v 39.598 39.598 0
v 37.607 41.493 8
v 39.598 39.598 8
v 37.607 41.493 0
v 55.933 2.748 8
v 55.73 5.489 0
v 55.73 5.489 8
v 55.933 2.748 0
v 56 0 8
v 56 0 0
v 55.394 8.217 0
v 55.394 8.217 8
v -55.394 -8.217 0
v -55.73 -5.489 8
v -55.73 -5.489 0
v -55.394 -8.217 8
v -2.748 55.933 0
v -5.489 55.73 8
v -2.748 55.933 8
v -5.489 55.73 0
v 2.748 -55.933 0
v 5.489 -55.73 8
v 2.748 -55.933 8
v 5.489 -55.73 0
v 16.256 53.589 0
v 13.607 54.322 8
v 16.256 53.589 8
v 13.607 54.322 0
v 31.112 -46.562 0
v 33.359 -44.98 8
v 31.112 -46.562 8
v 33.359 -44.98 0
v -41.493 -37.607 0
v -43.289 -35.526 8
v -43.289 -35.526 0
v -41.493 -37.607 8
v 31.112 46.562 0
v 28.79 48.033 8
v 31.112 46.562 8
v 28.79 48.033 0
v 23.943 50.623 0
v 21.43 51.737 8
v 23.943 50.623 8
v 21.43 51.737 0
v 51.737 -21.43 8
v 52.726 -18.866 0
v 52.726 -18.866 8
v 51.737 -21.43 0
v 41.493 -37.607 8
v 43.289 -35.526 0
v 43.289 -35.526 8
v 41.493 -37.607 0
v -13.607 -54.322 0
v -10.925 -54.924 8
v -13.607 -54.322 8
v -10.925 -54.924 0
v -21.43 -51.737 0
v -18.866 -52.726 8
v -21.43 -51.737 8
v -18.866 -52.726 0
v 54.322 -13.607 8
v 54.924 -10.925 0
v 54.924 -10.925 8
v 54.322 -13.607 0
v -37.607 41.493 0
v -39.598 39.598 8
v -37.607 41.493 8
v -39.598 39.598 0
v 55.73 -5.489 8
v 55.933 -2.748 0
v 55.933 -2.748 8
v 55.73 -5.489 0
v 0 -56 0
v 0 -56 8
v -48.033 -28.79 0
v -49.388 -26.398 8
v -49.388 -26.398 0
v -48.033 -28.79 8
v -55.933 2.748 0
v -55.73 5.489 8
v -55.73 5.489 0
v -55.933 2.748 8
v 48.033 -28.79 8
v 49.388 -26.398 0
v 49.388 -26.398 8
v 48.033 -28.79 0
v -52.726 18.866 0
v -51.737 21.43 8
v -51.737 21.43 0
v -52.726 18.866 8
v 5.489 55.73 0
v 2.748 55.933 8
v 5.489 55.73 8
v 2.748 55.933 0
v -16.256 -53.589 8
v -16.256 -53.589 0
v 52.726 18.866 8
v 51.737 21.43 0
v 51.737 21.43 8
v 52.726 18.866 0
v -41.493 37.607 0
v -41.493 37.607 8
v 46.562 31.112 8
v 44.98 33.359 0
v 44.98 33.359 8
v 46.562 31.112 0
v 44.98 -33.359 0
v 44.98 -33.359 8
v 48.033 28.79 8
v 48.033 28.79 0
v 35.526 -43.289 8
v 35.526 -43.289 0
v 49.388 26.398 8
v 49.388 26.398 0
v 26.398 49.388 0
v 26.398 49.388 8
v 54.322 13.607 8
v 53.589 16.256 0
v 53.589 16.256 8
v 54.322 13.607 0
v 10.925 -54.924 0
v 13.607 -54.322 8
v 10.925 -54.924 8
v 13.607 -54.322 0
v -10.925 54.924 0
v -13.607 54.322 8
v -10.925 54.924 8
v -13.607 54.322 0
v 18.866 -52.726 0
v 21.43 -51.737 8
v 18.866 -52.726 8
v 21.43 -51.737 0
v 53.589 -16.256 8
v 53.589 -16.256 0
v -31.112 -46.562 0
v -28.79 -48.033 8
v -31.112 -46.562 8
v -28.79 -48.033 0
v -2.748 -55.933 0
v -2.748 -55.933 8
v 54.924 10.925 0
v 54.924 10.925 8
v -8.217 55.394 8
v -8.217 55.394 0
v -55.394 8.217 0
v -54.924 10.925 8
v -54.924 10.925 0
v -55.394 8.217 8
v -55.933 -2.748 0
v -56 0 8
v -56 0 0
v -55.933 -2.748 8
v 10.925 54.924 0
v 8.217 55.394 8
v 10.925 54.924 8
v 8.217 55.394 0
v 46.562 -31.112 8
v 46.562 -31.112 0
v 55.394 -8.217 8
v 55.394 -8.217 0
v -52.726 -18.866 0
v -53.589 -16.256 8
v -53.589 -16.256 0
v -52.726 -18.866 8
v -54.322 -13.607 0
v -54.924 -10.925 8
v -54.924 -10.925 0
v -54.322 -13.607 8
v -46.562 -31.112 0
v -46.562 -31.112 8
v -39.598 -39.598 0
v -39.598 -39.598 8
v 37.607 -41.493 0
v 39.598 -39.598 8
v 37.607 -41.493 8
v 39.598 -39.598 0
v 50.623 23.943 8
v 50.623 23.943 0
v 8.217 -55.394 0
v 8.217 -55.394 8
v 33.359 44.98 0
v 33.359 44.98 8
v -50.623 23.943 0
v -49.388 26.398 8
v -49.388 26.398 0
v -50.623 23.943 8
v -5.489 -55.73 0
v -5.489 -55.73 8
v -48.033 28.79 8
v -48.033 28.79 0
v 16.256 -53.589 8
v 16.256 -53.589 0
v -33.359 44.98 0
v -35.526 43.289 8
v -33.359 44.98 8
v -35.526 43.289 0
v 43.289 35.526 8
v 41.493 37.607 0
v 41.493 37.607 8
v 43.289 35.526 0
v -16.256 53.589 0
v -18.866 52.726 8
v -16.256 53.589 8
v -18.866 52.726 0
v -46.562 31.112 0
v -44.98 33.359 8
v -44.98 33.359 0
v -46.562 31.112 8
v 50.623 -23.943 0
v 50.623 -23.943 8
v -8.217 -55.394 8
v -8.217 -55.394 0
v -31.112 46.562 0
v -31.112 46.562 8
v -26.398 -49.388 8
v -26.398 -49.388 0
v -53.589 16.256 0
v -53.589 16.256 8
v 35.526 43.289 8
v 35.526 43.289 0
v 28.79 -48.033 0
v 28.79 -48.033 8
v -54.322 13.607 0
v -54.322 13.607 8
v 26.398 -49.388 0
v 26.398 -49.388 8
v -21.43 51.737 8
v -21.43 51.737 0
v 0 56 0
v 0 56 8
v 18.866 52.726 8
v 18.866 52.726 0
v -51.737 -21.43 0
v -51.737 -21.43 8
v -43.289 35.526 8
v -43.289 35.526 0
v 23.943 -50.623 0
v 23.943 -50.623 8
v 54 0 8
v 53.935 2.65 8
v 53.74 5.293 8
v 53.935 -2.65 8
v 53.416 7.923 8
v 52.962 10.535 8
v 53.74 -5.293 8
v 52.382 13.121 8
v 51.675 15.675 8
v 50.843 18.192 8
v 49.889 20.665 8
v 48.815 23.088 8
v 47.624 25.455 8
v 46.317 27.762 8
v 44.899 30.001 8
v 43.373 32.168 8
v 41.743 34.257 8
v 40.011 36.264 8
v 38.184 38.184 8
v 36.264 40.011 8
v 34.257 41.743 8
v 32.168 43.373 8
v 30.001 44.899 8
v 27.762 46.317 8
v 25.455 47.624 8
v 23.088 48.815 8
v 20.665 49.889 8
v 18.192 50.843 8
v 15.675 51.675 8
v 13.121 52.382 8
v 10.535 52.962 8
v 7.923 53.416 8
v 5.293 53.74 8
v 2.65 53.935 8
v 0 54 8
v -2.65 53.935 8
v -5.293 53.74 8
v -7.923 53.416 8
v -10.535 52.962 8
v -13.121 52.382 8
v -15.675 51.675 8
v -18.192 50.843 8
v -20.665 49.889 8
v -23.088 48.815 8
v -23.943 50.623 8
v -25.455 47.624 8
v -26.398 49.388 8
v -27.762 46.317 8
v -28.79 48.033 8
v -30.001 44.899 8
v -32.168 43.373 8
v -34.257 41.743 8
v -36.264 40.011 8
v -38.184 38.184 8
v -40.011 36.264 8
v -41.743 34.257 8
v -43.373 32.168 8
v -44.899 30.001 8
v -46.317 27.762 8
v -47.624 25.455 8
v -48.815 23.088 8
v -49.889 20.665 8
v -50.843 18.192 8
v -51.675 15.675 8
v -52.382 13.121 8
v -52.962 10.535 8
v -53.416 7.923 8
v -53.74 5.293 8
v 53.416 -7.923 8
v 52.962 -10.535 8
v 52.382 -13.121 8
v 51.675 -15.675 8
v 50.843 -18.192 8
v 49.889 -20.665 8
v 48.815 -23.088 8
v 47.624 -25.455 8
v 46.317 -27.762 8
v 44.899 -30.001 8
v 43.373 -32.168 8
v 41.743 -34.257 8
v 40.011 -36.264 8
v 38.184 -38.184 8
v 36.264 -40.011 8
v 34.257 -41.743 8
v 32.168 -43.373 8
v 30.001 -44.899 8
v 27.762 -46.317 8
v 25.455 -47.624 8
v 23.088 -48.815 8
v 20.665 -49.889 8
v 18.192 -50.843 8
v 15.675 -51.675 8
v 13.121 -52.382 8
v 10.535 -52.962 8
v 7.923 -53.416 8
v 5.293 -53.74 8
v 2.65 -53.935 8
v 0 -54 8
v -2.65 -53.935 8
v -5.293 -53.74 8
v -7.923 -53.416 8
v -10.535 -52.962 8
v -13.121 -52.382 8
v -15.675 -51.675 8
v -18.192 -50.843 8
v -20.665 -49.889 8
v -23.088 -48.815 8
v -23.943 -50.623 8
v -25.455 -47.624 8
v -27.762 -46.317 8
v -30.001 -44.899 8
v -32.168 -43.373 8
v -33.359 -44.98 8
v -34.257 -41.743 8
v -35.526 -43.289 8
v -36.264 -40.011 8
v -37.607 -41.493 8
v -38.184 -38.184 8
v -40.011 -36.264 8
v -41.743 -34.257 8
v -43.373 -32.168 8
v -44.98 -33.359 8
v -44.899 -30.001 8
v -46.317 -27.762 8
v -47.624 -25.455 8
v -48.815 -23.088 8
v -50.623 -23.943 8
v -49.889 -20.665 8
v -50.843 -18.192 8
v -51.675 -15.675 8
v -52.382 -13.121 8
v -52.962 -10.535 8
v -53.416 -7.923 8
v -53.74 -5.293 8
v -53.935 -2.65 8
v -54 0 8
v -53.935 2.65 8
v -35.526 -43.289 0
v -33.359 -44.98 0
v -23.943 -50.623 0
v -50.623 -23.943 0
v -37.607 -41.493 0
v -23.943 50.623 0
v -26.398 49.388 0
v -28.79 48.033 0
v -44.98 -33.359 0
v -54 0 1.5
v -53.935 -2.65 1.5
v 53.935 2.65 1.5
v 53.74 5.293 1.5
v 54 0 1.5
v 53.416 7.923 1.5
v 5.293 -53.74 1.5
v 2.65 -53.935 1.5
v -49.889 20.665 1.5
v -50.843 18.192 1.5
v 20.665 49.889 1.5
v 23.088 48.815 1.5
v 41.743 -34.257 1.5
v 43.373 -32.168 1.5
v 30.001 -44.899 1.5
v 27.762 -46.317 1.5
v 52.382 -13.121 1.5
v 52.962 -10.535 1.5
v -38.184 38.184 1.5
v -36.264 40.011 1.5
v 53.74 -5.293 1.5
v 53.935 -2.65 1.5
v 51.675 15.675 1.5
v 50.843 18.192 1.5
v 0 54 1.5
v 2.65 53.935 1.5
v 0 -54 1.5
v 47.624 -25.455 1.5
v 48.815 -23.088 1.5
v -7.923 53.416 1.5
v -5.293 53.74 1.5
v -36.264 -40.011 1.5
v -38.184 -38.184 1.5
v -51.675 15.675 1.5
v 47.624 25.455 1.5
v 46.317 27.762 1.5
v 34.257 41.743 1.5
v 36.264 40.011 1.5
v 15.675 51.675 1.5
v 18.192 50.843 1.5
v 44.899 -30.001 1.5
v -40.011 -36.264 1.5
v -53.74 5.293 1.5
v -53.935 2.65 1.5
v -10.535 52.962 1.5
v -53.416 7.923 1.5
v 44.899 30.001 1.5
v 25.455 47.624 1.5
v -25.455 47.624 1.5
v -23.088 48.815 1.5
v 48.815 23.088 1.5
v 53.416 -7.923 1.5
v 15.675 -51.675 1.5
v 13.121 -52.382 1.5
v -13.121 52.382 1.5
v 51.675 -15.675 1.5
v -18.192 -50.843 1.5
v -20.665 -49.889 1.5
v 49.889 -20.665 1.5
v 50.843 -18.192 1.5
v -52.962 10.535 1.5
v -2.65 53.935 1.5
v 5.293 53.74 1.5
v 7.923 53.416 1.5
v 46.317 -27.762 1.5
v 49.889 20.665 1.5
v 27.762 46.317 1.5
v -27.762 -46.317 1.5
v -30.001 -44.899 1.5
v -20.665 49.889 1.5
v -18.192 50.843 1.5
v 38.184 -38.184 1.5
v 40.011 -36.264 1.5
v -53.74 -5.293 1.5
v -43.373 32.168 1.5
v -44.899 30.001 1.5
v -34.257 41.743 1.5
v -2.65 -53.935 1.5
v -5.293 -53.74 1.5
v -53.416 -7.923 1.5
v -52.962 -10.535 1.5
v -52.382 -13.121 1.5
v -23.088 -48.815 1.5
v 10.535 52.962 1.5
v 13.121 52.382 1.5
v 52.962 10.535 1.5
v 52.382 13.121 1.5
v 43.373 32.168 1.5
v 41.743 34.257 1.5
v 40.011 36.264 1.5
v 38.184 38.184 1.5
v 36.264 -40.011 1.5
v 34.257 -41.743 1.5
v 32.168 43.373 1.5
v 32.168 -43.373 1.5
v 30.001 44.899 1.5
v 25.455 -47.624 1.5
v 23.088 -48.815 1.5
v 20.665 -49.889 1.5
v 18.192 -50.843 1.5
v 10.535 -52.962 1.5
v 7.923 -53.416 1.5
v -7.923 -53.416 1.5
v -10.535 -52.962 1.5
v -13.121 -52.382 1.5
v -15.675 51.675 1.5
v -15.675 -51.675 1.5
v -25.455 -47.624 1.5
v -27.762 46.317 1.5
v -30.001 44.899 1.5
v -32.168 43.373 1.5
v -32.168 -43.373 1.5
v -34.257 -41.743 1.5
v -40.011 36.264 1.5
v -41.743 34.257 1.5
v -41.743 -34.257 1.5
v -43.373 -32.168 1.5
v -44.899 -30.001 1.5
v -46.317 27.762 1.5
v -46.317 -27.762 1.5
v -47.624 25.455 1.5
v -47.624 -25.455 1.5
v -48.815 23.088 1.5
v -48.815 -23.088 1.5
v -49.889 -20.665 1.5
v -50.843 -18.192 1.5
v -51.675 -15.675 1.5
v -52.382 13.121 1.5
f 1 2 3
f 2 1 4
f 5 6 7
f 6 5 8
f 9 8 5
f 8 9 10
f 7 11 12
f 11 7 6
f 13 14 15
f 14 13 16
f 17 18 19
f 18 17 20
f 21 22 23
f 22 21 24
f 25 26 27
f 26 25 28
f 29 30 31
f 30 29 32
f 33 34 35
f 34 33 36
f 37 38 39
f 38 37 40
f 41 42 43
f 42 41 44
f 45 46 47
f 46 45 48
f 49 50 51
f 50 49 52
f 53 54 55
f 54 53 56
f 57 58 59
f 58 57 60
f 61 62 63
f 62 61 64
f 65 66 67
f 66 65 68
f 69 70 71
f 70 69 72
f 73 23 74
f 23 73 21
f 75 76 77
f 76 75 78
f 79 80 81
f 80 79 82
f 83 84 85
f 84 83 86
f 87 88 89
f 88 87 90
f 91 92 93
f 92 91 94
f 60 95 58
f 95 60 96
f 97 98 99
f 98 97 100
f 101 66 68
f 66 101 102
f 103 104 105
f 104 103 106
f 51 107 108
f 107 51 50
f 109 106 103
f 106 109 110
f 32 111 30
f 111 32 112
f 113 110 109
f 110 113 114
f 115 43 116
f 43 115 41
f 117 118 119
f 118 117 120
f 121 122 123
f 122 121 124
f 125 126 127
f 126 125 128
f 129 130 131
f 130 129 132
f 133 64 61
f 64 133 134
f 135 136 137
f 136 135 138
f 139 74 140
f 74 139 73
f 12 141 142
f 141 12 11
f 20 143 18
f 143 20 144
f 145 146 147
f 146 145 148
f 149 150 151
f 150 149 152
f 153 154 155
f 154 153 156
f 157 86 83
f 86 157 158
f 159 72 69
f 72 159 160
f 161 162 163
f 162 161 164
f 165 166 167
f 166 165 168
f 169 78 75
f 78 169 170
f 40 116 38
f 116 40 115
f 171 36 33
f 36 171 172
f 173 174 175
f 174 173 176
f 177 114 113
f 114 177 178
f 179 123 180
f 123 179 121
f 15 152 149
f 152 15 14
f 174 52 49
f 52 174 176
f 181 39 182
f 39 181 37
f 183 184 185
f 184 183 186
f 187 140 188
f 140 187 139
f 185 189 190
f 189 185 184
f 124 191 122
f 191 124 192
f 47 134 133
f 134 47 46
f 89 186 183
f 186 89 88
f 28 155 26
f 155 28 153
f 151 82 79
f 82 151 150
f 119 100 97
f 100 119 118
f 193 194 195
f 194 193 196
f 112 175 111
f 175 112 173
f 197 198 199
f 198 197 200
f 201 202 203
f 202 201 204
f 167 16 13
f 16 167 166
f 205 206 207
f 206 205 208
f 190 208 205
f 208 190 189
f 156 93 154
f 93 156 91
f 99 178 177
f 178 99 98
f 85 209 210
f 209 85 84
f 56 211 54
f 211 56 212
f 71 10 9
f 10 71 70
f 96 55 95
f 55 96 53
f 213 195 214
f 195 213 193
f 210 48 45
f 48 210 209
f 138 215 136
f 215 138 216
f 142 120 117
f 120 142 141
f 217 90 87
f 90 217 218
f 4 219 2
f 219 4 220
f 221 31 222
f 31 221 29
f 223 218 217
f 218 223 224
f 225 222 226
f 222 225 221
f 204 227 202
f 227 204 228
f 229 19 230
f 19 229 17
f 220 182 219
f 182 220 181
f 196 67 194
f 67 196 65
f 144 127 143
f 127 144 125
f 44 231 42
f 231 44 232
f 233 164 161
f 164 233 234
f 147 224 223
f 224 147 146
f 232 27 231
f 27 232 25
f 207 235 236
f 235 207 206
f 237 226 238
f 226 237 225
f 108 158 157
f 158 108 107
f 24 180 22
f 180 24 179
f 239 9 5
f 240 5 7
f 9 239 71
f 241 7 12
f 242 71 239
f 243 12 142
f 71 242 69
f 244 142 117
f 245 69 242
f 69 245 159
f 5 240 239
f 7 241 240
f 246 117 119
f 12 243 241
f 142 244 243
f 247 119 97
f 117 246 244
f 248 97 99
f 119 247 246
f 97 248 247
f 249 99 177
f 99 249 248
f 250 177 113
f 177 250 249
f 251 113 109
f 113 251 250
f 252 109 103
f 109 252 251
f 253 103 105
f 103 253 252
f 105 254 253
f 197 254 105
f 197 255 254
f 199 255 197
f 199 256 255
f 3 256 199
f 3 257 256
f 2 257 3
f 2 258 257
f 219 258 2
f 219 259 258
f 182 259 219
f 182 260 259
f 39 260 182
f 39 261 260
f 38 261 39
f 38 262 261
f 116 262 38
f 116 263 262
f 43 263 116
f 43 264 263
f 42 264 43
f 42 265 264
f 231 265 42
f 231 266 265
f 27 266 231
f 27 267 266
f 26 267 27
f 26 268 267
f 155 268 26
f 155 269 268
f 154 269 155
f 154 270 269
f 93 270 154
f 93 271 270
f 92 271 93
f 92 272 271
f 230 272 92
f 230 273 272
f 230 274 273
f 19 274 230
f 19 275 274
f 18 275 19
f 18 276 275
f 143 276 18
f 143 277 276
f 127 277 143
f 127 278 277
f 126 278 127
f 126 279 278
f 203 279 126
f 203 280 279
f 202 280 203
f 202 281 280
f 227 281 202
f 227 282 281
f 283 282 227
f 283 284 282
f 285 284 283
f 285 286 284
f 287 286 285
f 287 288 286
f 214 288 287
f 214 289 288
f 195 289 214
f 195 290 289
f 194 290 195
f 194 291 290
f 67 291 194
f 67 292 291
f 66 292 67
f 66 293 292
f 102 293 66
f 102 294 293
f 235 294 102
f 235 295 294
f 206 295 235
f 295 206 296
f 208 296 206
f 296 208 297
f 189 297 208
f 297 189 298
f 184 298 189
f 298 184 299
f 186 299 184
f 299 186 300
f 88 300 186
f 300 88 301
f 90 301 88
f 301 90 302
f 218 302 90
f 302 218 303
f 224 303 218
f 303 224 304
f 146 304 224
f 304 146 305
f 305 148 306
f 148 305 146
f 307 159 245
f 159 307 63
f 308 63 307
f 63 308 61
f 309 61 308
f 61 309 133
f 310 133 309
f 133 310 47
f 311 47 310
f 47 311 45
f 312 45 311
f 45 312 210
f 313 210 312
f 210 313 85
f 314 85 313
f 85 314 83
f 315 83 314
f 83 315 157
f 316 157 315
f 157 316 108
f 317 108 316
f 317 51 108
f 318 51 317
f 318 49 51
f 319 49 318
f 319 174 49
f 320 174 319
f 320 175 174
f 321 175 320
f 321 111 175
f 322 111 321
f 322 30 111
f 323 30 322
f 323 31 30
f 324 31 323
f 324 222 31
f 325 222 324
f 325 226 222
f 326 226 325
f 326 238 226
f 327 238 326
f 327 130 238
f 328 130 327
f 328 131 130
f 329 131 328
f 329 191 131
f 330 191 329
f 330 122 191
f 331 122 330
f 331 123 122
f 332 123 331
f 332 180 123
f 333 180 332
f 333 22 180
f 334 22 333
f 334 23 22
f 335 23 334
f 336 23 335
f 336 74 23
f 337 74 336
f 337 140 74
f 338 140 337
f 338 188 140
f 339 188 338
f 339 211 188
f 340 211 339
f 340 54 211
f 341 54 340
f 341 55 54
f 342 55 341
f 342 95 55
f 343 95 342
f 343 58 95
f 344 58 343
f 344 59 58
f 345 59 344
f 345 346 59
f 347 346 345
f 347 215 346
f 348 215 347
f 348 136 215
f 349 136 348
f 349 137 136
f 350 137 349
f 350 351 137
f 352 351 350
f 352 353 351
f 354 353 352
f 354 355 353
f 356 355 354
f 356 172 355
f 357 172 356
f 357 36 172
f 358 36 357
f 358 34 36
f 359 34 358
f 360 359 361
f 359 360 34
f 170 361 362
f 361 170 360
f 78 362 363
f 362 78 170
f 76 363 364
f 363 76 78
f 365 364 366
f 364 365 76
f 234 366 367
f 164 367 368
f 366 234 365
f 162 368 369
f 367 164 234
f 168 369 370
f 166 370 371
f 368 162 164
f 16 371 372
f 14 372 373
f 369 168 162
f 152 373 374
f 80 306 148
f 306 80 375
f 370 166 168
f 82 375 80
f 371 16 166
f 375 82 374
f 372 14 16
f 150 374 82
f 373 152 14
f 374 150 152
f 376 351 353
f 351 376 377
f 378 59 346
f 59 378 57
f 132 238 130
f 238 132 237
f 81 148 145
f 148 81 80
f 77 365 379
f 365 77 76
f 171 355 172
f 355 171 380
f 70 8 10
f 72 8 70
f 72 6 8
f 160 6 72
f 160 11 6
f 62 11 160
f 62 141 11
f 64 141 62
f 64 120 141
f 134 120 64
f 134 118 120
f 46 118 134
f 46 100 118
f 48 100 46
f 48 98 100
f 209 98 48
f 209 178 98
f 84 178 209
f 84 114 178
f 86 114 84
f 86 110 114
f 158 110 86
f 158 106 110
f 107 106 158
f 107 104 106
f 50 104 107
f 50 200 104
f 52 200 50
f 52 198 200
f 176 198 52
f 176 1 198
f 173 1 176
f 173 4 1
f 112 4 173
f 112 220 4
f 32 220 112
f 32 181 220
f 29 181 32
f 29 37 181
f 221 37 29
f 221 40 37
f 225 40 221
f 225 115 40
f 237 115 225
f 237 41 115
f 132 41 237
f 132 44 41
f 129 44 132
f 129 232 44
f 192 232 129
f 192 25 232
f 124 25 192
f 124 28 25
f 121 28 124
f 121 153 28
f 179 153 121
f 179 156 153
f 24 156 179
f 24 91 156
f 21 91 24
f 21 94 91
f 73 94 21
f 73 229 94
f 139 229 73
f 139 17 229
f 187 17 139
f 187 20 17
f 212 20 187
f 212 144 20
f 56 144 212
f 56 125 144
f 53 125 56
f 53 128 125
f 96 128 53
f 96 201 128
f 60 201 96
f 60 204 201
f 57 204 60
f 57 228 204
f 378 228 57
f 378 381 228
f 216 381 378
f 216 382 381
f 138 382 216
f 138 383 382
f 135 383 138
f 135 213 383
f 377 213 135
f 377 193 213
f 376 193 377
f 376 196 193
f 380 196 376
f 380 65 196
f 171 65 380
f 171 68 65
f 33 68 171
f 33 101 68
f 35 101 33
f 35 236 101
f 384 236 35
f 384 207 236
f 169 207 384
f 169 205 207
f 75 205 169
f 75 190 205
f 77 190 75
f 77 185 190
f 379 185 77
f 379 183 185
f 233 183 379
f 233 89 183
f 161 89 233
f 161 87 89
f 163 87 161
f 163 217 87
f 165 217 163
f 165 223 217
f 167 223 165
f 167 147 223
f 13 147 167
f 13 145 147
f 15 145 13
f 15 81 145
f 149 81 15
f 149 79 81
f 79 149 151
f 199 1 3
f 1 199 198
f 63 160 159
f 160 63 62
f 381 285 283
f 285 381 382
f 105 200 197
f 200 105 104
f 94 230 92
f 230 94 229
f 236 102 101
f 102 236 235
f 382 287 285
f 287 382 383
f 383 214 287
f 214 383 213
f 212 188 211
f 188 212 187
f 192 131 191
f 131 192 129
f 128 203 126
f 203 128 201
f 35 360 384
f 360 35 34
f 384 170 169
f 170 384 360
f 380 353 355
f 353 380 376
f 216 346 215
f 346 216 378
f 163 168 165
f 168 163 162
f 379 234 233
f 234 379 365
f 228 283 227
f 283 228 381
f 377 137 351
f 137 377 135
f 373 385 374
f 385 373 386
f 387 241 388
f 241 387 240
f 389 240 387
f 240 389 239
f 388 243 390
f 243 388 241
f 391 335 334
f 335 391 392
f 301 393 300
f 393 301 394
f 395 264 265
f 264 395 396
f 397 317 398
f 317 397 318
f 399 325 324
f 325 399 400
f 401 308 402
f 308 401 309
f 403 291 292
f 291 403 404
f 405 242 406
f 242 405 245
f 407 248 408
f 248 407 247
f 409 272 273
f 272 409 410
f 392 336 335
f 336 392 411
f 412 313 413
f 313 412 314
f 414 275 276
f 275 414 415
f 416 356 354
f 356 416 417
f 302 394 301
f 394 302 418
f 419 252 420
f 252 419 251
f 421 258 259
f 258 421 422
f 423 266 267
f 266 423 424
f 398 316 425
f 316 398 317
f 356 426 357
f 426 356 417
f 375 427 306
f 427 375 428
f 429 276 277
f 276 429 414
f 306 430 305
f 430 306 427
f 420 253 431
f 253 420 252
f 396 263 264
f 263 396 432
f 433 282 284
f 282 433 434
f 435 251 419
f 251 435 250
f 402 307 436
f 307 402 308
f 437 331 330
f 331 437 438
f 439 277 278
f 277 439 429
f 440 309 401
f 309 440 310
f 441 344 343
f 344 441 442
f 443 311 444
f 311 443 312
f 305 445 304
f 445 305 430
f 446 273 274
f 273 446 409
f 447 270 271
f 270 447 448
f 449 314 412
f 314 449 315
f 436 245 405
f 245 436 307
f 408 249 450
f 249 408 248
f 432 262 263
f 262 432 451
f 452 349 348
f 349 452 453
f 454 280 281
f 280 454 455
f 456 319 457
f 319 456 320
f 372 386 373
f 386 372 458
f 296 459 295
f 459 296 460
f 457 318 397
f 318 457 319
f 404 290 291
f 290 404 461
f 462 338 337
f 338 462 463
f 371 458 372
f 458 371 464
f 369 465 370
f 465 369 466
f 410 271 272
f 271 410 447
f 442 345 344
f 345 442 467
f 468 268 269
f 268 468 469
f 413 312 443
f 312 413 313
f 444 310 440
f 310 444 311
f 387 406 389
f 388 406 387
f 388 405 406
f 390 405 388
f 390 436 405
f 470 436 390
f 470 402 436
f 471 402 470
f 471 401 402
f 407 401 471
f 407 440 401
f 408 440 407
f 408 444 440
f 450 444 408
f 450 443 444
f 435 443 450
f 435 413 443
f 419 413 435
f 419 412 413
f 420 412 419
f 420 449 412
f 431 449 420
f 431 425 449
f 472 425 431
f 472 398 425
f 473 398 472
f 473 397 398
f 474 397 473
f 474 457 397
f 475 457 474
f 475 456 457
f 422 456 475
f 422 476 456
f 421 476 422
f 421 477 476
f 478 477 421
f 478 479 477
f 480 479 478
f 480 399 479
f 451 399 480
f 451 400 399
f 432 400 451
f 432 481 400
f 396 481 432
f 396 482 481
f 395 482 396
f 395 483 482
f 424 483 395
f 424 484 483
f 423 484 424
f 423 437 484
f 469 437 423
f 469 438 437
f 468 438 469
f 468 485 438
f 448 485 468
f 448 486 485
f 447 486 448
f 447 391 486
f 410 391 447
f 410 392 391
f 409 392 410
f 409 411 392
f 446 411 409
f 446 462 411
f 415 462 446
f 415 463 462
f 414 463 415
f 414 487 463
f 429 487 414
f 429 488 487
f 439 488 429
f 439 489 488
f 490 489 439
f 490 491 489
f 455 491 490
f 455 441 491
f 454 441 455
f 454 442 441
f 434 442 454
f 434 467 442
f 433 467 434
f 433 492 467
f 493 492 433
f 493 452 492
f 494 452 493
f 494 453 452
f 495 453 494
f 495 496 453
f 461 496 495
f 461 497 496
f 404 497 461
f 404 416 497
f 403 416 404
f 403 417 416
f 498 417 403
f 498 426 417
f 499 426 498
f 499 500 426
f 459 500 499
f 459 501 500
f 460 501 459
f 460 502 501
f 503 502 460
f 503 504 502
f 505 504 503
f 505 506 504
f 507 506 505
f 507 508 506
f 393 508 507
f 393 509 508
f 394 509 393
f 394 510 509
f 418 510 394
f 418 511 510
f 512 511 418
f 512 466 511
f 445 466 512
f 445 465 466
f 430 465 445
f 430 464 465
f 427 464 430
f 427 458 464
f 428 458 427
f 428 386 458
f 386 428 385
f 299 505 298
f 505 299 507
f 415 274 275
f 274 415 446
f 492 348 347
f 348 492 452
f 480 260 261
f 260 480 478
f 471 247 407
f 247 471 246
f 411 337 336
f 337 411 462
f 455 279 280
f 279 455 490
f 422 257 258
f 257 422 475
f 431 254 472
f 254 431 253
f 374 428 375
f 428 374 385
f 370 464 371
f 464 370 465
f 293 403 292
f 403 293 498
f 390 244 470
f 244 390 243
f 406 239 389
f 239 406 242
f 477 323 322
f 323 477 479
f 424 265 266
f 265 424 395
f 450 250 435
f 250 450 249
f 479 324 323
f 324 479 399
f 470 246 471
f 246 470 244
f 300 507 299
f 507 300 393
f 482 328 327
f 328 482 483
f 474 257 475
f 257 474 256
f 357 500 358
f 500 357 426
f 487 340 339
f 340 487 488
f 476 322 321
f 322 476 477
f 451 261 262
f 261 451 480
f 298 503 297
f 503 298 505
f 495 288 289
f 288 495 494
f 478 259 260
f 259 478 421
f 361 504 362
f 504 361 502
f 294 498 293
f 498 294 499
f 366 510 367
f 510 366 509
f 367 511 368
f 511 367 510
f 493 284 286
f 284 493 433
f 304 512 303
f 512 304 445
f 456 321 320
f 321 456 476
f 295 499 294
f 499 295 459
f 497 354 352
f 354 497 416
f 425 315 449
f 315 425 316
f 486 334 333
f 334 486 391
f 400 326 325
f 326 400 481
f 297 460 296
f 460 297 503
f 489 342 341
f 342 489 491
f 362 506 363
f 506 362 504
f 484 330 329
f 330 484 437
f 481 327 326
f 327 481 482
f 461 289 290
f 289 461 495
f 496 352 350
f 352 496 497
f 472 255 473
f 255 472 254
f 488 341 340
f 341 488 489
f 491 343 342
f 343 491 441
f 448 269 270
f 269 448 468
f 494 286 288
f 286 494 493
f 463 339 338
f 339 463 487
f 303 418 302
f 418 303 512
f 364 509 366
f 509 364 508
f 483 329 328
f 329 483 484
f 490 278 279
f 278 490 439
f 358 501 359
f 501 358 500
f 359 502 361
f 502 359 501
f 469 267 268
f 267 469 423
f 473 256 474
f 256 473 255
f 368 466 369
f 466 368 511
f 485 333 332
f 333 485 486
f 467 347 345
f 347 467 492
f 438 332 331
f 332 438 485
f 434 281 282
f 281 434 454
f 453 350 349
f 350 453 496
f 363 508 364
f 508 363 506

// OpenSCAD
$fn = $preview ? 32 : 128;

outer_dim = 111.5;
inner_dim = 108.5;
bleed = 0.5;
height = 8;
thickness = 1.5;

difference() {
    cylinder(d=outer_dim+bleed, h=height);
    translate([0,0,thickness]) {
        cylinder(d=inner_dim-bleed, h=height);
    }
}
